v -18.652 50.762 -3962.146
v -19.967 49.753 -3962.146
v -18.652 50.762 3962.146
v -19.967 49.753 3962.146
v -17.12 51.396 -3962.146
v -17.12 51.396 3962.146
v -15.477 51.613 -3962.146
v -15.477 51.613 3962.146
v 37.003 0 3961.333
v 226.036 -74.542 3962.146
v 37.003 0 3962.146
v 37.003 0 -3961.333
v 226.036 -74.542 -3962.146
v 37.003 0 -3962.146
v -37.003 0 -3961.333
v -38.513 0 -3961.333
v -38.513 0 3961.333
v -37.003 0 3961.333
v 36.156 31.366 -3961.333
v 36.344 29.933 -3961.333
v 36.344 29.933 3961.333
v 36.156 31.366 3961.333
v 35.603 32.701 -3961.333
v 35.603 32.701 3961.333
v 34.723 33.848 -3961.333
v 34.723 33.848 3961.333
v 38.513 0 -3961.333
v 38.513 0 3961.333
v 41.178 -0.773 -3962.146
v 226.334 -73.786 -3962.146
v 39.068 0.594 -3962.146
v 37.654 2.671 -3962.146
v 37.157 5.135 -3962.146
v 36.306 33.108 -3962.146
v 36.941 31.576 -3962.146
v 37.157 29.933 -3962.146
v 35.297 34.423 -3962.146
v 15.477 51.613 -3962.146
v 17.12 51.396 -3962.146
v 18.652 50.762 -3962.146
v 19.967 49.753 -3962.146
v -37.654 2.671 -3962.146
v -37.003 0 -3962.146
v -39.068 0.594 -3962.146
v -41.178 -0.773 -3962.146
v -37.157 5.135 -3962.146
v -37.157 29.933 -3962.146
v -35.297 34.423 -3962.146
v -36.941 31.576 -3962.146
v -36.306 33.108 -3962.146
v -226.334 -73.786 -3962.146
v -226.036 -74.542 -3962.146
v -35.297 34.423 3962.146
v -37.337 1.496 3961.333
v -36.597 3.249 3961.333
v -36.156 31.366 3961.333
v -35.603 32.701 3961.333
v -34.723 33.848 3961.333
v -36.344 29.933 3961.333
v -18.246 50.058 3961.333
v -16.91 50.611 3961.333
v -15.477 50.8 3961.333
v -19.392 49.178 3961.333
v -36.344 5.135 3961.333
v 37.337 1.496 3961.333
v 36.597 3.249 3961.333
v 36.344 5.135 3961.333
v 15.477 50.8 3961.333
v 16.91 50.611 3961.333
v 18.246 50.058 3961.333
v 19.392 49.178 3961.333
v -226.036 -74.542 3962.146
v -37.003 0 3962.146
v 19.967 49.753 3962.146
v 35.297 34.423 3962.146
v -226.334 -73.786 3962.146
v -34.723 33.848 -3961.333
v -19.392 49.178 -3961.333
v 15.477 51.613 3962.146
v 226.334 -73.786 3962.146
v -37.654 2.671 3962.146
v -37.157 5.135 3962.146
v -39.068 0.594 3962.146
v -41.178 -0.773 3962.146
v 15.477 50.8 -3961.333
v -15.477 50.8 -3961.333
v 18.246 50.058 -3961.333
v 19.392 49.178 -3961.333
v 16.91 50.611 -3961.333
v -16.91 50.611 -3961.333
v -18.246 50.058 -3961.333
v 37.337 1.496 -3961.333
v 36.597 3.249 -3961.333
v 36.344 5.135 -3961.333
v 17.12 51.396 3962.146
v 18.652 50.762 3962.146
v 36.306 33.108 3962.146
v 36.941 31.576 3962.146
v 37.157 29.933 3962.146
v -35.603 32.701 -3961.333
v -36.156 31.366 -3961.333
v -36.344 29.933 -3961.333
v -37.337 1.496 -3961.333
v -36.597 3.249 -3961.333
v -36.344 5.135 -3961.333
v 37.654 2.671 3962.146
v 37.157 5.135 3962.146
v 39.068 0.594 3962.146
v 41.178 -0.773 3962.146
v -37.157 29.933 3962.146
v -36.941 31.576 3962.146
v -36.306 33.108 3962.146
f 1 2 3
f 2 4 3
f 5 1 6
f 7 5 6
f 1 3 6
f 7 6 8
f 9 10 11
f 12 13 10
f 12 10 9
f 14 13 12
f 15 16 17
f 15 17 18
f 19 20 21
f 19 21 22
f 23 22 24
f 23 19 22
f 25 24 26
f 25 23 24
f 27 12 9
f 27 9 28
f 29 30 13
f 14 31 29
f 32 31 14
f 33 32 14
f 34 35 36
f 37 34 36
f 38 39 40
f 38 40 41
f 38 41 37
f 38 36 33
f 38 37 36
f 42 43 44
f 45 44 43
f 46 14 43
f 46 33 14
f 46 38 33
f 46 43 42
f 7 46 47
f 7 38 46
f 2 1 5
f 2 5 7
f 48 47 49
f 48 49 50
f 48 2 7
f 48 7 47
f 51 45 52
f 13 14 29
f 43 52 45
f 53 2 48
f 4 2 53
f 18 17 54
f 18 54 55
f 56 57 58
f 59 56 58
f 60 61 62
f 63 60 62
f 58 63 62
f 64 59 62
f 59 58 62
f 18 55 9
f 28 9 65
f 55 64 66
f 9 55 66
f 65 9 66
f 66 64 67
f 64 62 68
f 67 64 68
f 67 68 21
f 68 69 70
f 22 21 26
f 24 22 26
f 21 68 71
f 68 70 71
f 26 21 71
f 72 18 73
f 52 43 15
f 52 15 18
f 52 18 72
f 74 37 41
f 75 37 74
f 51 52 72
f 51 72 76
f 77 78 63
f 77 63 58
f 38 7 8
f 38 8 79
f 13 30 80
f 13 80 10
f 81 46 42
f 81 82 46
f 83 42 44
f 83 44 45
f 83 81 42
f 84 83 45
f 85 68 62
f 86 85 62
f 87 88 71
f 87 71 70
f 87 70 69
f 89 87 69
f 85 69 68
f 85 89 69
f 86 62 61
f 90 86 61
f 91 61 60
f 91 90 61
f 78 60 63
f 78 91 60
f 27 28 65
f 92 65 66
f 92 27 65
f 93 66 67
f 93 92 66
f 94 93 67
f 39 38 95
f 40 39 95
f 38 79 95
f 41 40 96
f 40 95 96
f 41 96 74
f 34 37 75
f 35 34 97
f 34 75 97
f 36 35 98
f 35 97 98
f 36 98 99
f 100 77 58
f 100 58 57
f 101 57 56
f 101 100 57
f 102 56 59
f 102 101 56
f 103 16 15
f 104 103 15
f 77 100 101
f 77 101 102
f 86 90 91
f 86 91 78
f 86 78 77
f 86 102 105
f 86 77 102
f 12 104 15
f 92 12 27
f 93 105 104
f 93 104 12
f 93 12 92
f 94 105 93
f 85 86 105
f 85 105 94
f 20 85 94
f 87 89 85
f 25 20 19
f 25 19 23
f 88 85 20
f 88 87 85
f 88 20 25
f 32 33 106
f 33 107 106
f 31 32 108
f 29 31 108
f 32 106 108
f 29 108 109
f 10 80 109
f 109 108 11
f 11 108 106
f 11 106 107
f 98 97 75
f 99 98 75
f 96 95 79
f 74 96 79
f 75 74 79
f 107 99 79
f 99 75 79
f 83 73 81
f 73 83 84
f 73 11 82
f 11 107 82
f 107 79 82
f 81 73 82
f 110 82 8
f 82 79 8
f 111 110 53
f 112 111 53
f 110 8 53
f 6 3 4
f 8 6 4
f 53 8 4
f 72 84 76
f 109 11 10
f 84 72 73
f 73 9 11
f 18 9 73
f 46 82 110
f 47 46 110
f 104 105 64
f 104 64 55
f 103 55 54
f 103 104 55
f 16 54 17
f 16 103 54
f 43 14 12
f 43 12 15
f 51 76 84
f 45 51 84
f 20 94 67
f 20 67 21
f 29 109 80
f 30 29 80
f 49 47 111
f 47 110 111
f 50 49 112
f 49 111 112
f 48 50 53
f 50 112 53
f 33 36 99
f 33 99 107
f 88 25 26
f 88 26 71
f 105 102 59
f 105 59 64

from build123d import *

# Parameters (mm, degrees)
BOSS_EXTRUDE1_DEPTH      = 3962.146
BOSS_EXTRUDE1_DEPTH_BACK = 3962.146
CHAMFER1_SIZE            = 19.05
FILLET1_R                = 6.35
SHELL1_START             = -3961.3332
SHELL1_DEPTH             = 7922.6664


# Read off the part's stored shape, not the designer's step: Shell1
with BuildPart() as part:
    # Sketch1 → Boss-Extrude1 (new, two sides: drawn at the far end of the back side and taken through both)
    with BuildSketch(Plane.XY.offset(-BOSS_EXTRUDE1_DEPTH_BACK)):
        Polygon((-37.157189229, 0.8128), (-37.157189229, 51.6128), (37.157189229, 51.6128), (37.157189229, 0.8128), (226.334430672, -73.786204522), (226.036261318, -74.542338687), (37.00272, 0), (-37.00272, 0), (-226.036261318, -74.542338687), (-226.334430672, -73.786204522), align=None)
    extrude(amount=BOSS_EXTRUDE1_DEPTH + BOSS_EXTRUDE1_DEPTH_BACK)

    # Chamfer1
    chamfer1_edges = [part.edges().sort_by_distance(p)[0] for p in [
        (-37.157189229, 51.6128, 0),
        (37.157189229, 51.6128, 0),
    ]]
    chamfer(chamfer1_edges, length=CHAMFER1_SIZE)

    # Fillet1
    fillet1_edges = [part.edges().sort_by_distance(p)[0] for p in [
        (-37.157189229, 0.8128, 0),
        (37.157189229, 0.8128, 0),
        (37.157189229, 32.5628, 0),
        (-18.107189229, 51.6128, 0),
        (18.107189229, 51.6128, 0),
        (-37.157189229, 32.5628, 0),
    ]]
    fillet(fillet1_edges, radius=FILLET1_R)

    # Shell1 outline → Shell1 (cut)
    with BuildSketch(Plane.XY.offset(SHELL1_START)):
        with BuildLine():
            ThreePointArc((-36.344389229, 5.13465814), (-36.90880265, 2.347724631), (-38.513093754, 0))
            Line((-38.513093754, 0), (38.513093754, 0))
            ThreePointArc((38.513093754, 0), (36.90880265, 2.347724631), (36.344389229, 5.13465814))
            Line((36.344389229, 5.13465814), (36.344389229, 29.932543879))
            ThreePointArc((36.344389229, 29.932543879), (35.922894977, 32.051538581), (34.722580898, 33.847935548))
            Line((34.722580898, 33.847935548), (19.392324777, 49.178191669))
            ThreePointArc((19.392324777, 49.178191669), (17.59592781, 50.378505747), (15.476933108, 50.8))
            Line((15.476933108, 50.8), (-15.476933108, 50.8))
            ThreePointArc((-15.476933108, 50.8), (-17.59592781, 50.378505747), (-19.392324777, 49.178191669))
            Line((-19.392324777, 49.178191669), (-34.722580898, 33.847935548))
            ThreePointArc((-34.722580898, 33.847935548), (-35.922894977, 32.051538581), (-36.344389229, 29.932543879))
            Line((-36.344389229, 29.932543879), (-36.344389229, 5.13465814))
        make_face()
    extrude(amount=SHELL1_DEPTH, mode=Mode.SUBTRACT)


solid = part.part
